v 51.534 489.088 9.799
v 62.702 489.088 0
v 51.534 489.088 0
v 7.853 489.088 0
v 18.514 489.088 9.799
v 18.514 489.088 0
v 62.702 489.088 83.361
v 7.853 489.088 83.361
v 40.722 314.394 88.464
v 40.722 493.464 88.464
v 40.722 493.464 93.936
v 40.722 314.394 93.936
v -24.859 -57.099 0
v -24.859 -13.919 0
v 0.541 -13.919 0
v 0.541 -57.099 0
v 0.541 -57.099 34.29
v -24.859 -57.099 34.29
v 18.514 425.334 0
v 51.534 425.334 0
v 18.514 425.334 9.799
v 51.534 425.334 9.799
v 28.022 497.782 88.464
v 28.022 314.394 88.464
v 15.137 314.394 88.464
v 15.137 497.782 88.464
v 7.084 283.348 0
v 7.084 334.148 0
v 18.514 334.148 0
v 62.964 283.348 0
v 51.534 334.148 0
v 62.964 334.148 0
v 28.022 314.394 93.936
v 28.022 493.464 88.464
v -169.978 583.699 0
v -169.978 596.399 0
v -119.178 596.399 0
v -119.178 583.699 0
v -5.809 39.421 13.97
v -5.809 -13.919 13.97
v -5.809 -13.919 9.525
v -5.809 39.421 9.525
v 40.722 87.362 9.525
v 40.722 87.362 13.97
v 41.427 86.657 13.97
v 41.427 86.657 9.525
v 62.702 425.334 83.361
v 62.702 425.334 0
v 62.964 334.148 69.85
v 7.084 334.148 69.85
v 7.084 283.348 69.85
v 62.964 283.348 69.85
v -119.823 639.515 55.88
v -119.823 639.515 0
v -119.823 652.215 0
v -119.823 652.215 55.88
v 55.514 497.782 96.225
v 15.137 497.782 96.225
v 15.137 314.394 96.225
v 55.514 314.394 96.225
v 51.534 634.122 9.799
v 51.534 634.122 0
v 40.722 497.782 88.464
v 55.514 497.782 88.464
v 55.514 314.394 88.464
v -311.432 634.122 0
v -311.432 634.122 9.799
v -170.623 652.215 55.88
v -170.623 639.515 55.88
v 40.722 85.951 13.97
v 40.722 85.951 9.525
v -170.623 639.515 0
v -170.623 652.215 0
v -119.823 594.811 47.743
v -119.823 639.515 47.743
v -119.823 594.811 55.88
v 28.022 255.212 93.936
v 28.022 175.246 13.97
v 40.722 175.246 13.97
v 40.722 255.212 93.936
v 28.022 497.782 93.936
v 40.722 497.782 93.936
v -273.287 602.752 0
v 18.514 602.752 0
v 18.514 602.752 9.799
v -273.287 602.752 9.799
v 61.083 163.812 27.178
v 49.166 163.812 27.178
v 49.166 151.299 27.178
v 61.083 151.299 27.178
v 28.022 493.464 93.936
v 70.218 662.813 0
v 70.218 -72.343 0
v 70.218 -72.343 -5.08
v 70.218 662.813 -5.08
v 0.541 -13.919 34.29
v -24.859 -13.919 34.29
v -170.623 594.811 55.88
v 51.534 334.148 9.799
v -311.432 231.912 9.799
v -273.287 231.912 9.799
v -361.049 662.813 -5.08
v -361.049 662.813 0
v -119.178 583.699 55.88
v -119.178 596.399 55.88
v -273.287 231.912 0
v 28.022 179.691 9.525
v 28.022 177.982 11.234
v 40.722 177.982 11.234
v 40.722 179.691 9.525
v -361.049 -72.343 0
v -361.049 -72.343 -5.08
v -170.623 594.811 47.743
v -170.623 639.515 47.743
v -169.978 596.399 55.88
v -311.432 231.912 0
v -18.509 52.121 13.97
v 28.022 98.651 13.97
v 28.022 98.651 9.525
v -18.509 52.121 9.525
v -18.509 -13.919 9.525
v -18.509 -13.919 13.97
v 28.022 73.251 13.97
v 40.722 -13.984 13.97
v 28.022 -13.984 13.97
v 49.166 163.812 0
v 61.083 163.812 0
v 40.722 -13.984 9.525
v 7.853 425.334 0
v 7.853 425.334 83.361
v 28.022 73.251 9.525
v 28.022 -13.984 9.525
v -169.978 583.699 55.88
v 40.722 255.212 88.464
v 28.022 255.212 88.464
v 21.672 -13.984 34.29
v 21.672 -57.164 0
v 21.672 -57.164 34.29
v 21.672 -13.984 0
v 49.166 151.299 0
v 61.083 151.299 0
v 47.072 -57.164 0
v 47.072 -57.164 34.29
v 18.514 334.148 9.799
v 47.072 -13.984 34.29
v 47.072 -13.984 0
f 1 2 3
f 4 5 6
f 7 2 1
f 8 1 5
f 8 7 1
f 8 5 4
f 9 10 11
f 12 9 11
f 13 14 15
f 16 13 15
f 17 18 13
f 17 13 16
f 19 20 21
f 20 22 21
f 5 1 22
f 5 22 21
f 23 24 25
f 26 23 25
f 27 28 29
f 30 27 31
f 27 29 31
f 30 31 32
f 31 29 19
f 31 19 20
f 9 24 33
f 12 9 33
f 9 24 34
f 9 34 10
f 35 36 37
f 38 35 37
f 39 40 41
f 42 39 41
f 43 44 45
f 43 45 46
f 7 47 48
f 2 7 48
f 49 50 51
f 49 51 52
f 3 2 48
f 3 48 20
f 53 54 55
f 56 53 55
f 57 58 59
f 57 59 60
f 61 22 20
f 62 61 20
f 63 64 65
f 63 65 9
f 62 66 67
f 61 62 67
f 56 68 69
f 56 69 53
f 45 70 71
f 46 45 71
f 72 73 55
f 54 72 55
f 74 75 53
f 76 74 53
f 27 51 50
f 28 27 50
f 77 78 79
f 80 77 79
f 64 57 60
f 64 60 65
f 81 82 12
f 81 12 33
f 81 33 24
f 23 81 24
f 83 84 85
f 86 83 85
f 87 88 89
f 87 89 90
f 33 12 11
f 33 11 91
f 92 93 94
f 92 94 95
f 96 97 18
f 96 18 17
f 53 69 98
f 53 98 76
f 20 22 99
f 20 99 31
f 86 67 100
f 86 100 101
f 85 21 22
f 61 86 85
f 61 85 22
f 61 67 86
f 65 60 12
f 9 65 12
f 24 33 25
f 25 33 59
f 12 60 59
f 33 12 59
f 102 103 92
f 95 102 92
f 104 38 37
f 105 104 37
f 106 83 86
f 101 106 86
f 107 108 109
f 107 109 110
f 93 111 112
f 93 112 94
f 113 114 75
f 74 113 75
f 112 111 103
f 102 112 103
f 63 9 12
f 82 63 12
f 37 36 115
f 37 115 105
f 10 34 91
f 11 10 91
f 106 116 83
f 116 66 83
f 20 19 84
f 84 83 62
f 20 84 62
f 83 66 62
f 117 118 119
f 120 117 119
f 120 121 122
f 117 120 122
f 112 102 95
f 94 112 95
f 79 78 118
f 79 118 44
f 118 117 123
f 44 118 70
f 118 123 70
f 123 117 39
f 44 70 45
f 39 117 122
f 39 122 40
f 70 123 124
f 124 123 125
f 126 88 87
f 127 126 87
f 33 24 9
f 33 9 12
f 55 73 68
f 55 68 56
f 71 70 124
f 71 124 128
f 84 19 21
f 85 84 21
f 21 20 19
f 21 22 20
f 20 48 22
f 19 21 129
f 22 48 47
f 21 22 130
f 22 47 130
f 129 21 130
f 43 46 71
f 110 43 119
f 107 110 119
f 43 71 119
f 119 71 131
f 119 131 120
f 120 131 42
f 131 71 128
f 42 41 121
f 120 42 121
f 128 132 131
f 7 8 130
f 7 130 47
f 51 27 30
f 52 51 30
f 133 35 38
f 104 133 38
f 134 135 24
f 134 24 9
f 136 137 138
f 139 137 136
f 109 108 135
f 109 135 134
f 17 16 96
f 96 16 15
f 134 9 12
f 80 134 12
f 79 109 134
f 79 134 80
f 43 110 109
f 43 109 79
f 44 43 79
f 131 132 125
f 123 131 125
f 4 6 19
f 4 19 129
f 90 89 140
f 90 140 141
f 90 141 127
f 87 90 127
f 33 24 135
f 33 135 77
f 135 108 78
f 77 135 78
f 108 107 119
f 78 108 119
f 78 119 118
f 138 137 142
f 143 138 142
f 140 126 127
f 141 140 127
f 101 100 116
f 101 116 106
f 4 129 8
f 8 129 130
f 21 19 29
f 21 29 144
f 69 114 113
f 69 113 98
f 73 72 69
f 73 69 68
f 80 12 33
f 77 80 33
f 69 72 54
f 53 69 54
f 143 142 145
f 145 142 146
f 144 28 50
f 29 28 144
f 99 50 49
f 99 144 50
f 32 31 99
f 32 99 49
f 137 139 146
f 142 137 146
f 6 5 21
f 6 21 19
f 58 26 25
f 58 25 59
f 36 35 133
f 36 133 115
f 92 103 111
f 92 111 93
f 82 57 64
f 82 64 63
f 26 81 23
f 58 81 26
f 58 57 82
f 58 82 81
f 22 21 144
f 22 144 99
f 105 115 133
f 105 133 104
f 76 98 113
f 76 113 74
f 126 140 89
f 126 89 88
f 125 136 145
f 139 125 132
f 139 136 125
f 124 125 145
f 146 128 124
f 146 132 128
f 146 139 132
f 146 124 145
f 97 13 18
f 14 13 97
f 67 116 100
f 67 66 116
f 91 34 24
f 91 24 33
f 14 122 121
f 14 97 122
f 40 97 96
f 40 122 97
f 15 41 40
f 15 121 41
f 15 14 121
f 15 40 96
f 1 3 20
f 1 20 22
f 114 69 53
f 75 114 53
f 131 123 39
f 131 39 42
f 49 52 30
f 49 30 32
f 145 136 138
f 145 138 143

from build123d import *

# Parameters (mm, degrees)
F0_W         = 25.4
F0_H         = 43.18
F1_DEPTH     = 34.29
F4_DEPTH     = 186.69
F5_DEPTH     = 66.04
F6_SIZE      = 12.69999
F7_DEPTH     = 66.802
F8_W         = 11.9172371924
F8_H         = 12.5130861998
F9_DEPTH     = 27.178
F10_DEPTH    = 7.62
F11_T1_DEPTH = 38.8282991577
F12_W        = 12.7
F12_H        = 3.8690640952
F13_DEPTH    = 114.3
F14_T1_DEPTH = 38.8282991577
F15_DEPTH    = 59.182
F16_W        = 55.88
F16_H        = 50.8
F17_DEPTH    = 69.85
F19_DEPTH    = 91.186
F21_DEPTH    = 63.754
F22_DEPTH    = 208.788
F24_DEPTH    = 183.388
F25_DEPTH    = 179.07
F26_W        = 31.3697251636
F26_H        = 9.7994571552
F27_DEPTH    = 271.78
F28_DEPTH    = 58.166
F29_W        = 38.1454027963
F29_H        = 9.7994571552
F30_DEPTH    = 370.84
F31_W        = 50.8
F31_H        = 12.7
F32_DEPTH    = 55.88
F33_W        = 50.8
F33_H        = 8.1367950189
F34_DEPTH    = 44.704
F35_W        = 431.2671199441
F35_H        = 735.1557686925
F36_DEPTH    = 5.08


# Not quite as in the source:
# - a fillet or chamfer that OpenCascade refuses, or shapes differently, is made with other operations: its cross-section is extruded or revolved along the edge and cut away or added
# - a fillet or chamfer is up to 0.001 mm smaller than in the source, because OpenCascade refuses the exact size


with BuildPart() as f1:
    # F0 (on Top) → F1 (new body)
    with BuildSketch(Plane.XY):
        with Locations((-12.1586725817, -35.5092528684)):
            Rectangle(F0_W, F0_H)
    extrude(amount=F1_DEPTH)

    # F3 (on face) → F5 (join)
    with BuildSketch(Plane(origin=(0, -13.9192528684, 0), x_dir=(-1, 0, 0), z_dir=(0, 1, 0))):
        Polygon((12.1586725817, 13.97), (5.8086725817, 13.97), (5.8086725817, 9.525), (12.1586725817, 9.525), (18.5086725817, 9.525), (18.5086725817, 11.7475), (18.5086725817, 13.97), align=None)
    extrude(amount=F5_DEPTH)

    # F6 (size 12.7 in the source; OpenCascade refuses exactly that, so slightly less here)
    f6_edges = [f1.edges().sort_by_distance(p)[0] for p in [
        (-5.808673, 52.120747, 11.7475),
    ]]
    chamfer(f6_edges, length=F6_SIZE)

    # F7 (add): a face of the model
    f7_faces = [f1.faces().sort_by_distance(p)[0] for p in [
        (-12.1586675817, 45.7707521316, 11.7475),
    ]]


with BuildPart() as f1b:
    # F0 (on Top) → F1, piece 2 (new body)
    with BuildSketch(Plane.XY):
        with Locations((34.3718913153, -35.5737248565)):
            Rectangle(F0_W, F0_H)
    extrude(amount=F1_DEPTH)

    # F2 (on face) → F4 (join)
    with BuildSketch(Plane(origin=(0, -13.9837248565, 0), x_dir=(-1, 0, 0), z_dir=(0, 1, 0))):
        Polygon((-34.3718913153, 13.97), (-40.7218913153, 13.97), (-40.7218913153, 9.525), (-34.3718913153, 9.525), (-28.0218913153, 9.525), (-28.0218913153, 11.7475), (-28.0218913153, 13.97), align=None)
    extrude(amount=F4_DEPTH)


with BuildPart() as f1_1:
    add(f1.part)

    add(f1b.part)  # F7 merges F1b
    extrude(f7_faces, amount=F7_DEPTH)

    # F10 (add): a face of the model
    f10_faces = [f1_1.faces().sort_by_distance(p)[0] for p in [
        (34.3718913153, 172.7062751435, 11.7475),
    ]]
    extrude(f10_faces, amount=F10_DEPTH)

    # F11: chamfer of 5.08 on 1 edges, made by hand

    # F11_s2 → F11_t1 (cut)
    with BuildSketch(Plane.YZ.offset(14.9577417365)):
        Polygon((175.2462751435, 13.97), (180.3262751435, 8.89), (180.3262751435, 13.97), align=None)
    extrude(amount=F11_T1_DEPTH, mode=Mode.SUBTRACT)

    # F12 (on face) → F13 (join)
    with BuildSketch(Plane(origin=(0, 94.6081375717, 94.6081375717), x_dir=(1, 0, 0), z_dir=(0, 0.7071067812, 0.7071067812))):
        with Locations((34.3718913153, 115.9740798461)):
            Rectangle(F12_W, F12_H)
    extrude(amount=F13_DEPTH)

    # F14: chamfer of 5.08 on 1 edges, made by hand

    # F14_s2 → F14_t1 (cut)
    with BuildSketch(Plane.YZ.offset(14.9577417365)):
        Polygon((255.2123192432, 88.4643611826), (255.2123192432, 95.6485660795), (258.8044216917, 92.0564636311), align=None)
    extrude(amount=F14_T1_DEPTH, mode=Mode.SUBTRACT)

    # F15 (add): a face of the model
    f15_faces = [f1_1.faces().sort_by_distance(p)[0] for p in [
        (34.3718913153, 255.2123192432, 91.2002026412),
    ]]
    extrude(f15_faces, amount=F15_DEPTH)


with BuildPart() as f9:
    # F8 (on Top) → F9 (new body)
    with BuildSketch(Plane.XY):
        with Locations((55.1246125251, 157.5556769967)):
            Rectangle(F8_W, F8_H)
    extrude(amount=F9_DEPTH)


with BuildPart() as f17:
    # F16 (on Top) → F17 (new body)
    with BuildSketch(Plane.XY):
        with Locations((35.0235989317, 308.7478742687)):
            Rectangle(F16_W, F16_H)
    extrude(amount=F17_DEPTH)

    # F18 (on face) → F19 (join)
    with BuildSketch(Plane(origin=(0, 334.1478742687, 0), x_dir=(-1, 0, 0), z_dir=(0, 1, 0))):
        Polygon((-51.5335989317, 4.8997285776), (-51.5335989317, 0), (-18.5135989317, 0), (-18.5135989317, 4.8997285776), (-18.5135989317, 9.7994571552), (-51.5335989317, 9.7994571552), align=None)
    extrude(amount=F19_DEPTH)


with BuildPart() as f21:
    # F20 (on face) → F21 (new body)
    with BuildSketch(Plane(origin=(0, 425.3338742687, 0), x_dir=(-1, 0, 0), z_dir=(0, 1, 0))):
        Polygon((-7.8530972824, 83.3608135581), (-62.7023540437, 83.3608135581), (-62.7023540437, 0), (-51.5335989317, 0), (-51.5335989317, 9.7994571552), (-18.5135989317, 9.7994571552), (-18.5135989317, 0), (-7.8530972824, 0), align=None)
    extrude(amount=F21_DEPTH)


with BuildPart() as f22:
    # F22 (new): a face of the model
    f22_faces = [f17.part.faces().sort_by_distance(p)[0] for p in [
        (35.0235989317, 425.3338742687, 4.8997285776),
    ]]
    extrude(f22_faces, amount=F22_DEPTH)

    # F26 (on face) → F27 (join)
    with BuildSketch(Plane(origin=(18.5135989317, 0, 0), x_dir=(0, -1, 0), z_dir=(-1, 0, 0))):
        with Locations((-618.4370116869, 4.8997285776)):
            Rectangle(F26_W, F26_H)
    extrude(amount=F27_DEPTH)

    # F28 (add): a face of the model
    f28_faces = [f22.faces().sort_by_distance(p)[0] for p in [
        (-253.2664010683, 618.4370116869, 4.8997285776),
    ]]
    extrude(f28_faces, amount=F28_DEPTH)

    # F29 (on face) → F30 (join)
    with BuildSketch(Plane.XZ.offset(-602.7521491051)):
        with Locations((-292.3596996701, 4.8997285776)):
            Rectangle(F29_W, F29_H)
    extrude(amount=F30_DEPTH)


with BuildPart() as f24:
    # F23 (on face) → F24 (new body)
    with BuildSketch(Plane(origin=(0, 314.3943192432, 0), x_dir=(-1, 0, 0), z_dir=(0, 1, 0))):
        Polygon((-15.1371452957, 96.2249219918), (-55.5143468082, 96.2249219918), (-55.5143468082, 88.4643611826), (-40.7218913153, 88.4643611826), (-40.7218913153, 93.9360440997), (-28.0218913153, 93.9360440997), (-28.0218913153, 88.4643611826), (-15.1371452957, 88.4643611826), align=None)
    extrude(amount=F24_DEPTH)


with BuildPart() as f25:
    # F25 (new): a face of the model
    f25_faces = [f1_1.part.faces().sort_by_distance(p)[0] for p in [
        (34.3718913153, 314.3943192432, 91.2002026412),
    ]]
    extrude(f25_faces, amount=F25_DEPTH)


with BuildPart() as f32:
    # F31 (on Top) → F32 (new body)
    with BuildSketch(Plane.XY):
        with Locations((-145.2229168913, 645.8647573679)):
            Rectangle(F31_W, F31_H)
    extrude(amount=F32_DEPTH)


with BuildPart() as f32b:
    # F31 (on Top) → F32, piece 2 (new body)
    with BuildSketch(Plane.XY):
        with Locations((-144.5784862739, 590.0489869958)):
            Rectangle(F31_W, F31_H)
    extrude(amount=F32_DEPTH)


with BuildPart() as f34:
    # F33 (on face) → F34 (new body)
    with BuildSketch(Plane.XZ.offset(-639.5147573679)):
        with Locations((-145.2229168913, 51.8116024905)):
            Rectangle(F33_W, F33_H)
    extrude(amount=F34_DEPTH)


with BuildPart() as f36:
    # F35 (on Top) → F36 (new body)
    with BuildSketch(Plane.XY):
        with Locations((-145.4154662788, 295.2351234853)):
            Rectangle(F35_W, F35_H)
    extrude(amount=-F36_DEPTH)


solid = Compound([f1_1.part, f9.part, f17.part, f21.part, f22.part, f24.part, f25.part, f32.part, f32b.part, f34.part, f36.part])
